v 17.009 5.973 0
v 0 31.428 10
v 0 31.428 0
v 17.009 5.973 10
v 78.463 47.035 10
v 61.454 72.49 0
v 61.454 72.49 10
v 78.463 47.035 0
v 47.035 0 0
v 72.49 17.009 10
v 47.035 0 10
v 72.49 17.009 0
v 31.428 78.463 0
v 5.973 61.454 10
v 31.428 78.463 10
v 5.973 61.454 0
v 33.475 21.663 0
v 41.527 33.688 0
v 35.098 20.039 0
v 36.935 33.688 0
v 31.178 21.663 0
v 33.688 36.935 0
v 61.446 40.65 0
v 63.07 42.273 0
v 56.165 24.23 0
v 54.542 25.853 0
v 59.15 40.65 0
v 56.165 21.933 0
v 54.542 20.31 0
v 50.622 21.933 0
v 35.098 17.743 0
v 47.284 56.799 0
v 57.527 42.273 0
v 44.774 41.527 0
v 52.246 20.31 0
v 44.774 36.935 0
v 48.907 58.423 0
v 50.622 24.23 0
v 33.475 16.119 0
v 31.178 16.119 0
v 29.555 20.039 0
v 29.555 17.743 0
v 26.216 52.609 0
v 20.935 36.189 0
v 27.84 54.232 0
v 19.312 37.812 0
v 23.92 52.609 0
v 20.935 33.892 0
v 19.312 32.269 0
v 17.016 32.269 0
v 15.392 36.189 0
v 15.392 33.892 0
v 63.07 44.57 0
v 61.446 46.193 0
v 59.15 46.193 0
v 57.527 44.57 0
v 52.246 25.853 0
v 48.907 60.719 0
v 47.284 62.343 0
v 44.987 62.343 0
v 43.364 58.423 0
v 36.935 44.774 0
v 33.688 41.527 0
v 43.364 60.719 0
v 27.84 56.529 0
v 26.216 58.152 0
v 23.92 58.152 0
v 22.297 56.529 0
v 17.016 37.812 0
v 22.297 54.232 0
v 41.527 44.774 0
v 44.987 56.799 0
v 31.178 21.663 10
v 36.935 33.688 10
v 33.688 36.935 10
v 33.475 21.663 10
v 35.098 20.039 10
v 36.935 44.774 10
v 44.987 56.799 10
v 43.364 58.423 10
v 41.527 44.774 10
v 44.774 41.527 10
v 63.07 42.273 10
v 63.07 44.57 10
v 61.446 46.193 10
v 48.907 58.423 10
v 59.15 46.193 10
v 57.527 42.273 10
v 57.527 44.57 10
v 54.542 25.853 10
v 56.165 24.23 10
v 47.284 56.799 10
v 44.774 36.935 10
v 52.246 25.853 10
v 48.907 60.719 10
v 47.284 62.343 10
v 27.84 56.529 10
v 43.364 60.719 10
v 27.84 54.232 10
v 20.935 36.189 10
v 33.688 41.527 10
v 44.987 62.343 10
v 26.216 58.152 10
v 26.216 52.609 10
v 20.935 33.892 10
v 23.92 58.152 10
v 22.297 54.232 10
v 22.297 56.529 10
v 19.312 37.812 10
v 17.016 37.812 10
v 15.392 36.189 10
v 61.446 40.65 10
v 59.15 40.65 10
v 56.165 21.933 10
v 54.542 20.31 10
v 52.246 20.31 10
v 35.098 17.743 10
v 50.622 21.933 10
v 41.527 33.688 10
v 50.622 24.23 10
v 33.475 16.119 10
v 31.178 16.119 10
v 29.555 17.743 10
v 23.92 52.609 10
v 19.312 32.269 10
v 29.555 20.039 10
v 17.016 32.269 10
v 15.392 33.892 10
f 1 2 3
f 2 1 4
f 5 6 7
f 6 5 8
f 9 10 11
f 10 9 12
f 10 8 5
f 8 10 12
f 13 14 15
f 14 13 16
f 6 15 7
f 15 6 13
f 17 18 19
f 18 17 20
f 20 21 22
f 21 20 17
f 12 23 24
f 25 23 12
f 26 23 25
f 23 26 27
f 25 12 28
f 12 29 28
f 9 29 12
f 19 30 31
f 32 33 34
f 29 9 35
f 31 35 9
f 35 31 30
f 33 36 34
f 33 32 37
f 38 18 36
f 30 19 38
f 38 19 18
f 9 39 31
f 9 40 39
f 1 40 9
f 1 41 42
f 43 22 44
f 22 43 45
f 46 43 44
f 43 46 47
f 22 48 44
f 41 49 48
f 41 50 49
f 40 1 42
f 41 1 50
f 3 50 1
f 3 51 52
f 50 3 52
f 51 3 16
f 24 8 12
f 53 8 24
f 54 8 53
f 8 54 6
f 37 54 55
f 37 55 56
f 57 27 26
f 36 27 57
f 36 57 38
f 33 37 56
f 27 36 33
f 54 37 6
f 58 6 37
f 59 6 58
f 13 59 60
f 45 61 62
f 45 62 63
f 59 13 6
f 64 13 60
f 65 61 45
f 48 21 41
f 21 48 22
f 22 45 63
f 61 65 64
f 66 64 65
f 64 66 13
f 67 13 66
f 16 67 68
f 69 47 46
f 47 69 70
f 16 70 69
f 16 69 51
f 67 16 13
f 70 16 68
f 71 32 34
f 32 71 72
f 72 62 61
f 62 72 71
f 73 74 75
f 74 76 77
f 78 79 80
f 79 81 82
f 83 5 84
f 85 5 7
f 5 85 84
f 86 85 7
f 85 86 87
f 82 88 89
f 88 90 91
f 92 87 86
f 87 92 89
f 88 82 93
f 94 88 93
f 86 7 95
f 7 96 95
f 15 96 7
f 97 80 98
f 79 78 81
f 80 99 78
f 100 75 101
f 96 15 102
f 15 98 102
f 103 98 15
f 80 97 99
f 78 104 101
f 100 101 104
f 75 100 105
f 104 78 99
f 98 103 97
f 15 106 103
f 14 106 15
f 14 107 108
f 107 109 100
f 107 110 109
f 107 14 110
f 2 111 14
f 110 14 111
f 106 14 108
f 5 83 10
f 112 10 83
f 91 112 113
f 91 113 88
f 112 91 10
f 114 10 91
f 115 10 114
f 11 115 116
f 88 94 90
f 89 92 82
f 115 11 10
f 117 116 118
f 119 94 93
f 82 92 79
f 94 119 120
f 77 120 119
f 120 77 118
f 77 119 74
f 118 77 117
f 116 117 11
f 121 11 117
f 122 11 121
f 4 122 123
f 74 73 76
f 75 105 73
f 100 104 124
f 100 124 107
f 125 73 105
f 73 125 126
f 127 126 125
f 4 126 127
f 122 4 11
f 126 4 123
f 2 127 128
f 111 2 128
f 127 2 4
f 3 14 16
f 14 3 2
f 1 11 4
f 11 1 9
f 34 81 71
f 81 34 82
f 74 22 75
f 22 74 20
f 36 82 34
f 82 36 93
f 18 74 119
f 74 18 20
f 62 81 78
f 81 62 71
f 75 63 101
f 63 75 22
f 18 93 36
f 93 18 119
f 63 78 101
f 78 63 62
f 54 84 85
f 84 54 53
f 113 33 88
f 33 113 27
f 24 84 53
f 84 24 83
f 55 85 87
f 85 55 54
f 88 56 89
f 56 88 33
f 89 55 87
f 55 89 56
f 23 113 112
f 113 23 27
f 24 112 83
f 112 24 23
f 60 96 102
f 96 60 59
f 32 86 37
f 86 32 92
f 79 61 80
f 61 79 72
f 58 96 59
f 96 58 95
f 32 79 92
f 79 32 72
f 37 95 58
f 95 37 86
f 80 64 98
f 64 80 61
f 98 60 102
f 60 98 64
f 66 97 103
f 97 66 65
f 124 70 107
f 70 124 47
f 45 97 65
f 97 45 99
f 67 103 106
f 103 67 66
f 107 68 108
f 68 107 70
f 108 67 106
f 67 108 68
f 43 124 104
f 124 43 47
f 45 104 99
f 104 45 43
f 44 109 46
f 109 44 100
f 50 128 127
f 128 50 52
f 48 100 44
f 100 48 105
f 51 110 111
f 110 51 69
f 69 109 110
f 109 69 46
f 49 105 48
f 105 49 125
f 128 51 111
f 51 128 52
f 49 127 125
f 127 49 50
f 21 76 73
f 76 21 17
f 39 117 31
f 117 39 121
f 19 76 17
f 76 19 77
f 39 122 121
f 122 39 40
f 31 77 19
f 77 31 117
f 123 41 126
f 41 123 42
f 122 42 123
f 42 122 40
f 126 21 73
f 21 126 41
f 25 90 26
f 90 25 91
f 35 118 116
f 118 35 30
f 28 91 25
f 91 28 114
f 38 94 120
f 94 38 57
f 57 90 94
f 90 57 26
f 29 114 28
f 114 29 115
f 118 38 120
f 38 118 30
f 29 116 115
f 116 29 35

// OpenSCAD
$fn = 32;

// ----------------------------------------------------------------------
// Polygon plate: 8-gon R40, 6 bolt windows
// ----------------------------------------------------------------------

// --- parameters (mm) ---
sides = 8;                // number of polygon sides
plate_r = 40;             // circumscribed radius of the polygon
bore_r = 6;               // centre bore radius
bolts = 6;                // number of bolt windows
ring_r = 21.48;           // bolt-circle radius
bolt_r = 3;               // bolt window radius
plate_t = 10;             // plate thickness, Z (extrusion height)

plate_d = 2 * plate_r;  // circumscribed diameter
bore_d = 2 * bore_r;  // centre bore diameter
bolt_d = 2 * bolt_r;  // bolt window diameter
ring_d = 2 * ring_r;  // bolt-circle diameter

profile = [[78.463, 47.035], [61.454, 72.49], [31.428, 78.463], [5.973, 61.454], [0, 31.428], [17.009, 5.973], [47.035, 0], [72.49, 17.009]];  // primary outline, 8 points, counter clockwise
void_1 = [[44.774, 41.527], [41.527, 44.774], [36.935, 44.774], [33.688, 41.527], [33.688, 36.935], [36.935, 33.688], [41.527, 33.688], [44.774, 36.935]];  // centre bore, 8 points
void_2 = [[63.07, 44.57], [61.446, 46.193], [59.15, 46.193], [57.527, 44.57], [57.527, 42.273], [59.15, 40.65], [61.446, 40.65], [63.07, 42.273]];  // bolt window 1, 8 points
void_3 = [[48.907, 60.719], [47.284, 62.343], [44.987, 62.343], [43.364, 60.719], [43.364, 58.423], [44.987, 56.799], [47.284, 56.799], [48.907, 58.423]];  // bolt window 2, 8 points
void_4 = [[27.84, 56.529], [26.216, 58.152], [23.92, 58.152], [22.297, 56.529], [22.297, 54.232], [23.92, 52.609], [26.216, 52.609], [27.84, 54.232]];  // bolt window 3, 8 points
void_5 = [[20.935, 36.189], [19.312, 37.812], [17.016, 37.812], [15.392, 36.189], [15.392, 33.892], [17.016, 32.269], [19.312, 32.269], [20.935, 33.892]];  // bolt window 4, 8 points
void_6 = [[35.098, 20.039], [33.475, 21.663], [31.178, 21.663], [29.555, 20.039], [29.555, 17.743], [31.178, 16.119], [33.475, 16.119], [35.098, 17.743]];  // bolt window 5, 8 points
void_7 = [[56.165, 24.23], [54.542, 25.853], [52.246, 25.853], [50.622, 24.23], [50.622, 21.933], [52.246, 20.31], [54.542, 20.31], [56.165, 21.933]];  // bolt window 6, 8 points

// --- the one profile operation ---
difference() {
  linear_extrude(height = plate_t) polygon(points = profile);
  translate([0, 0, -1])
    linear_extrude(height = plate_t + 2) polygon(points = void_1);
  translate([0, 0, -1])
    linear_extrude(height = plate_t + 2) polygon(points = void_2);
  translate([0, 0, -1])
    linear_extrude(height = plate_t + 2) polygon(points = void_3);
  translate([0, 0, -1])
    linear_extrude(height = plate_t + 2) polygon(points = void_4);
  translate([0, 0, -1])
    linear_extrude(height = plate_t + 2) polygon(points = void_5);
  translate([0, 0, -1])
    linear_extrude(height = plate_t + 2) polygon(points = void_6);
  translate([0, 0, -1])
    linear_extrude(height = plate_t + 2) polygon(points = void_7);
}
